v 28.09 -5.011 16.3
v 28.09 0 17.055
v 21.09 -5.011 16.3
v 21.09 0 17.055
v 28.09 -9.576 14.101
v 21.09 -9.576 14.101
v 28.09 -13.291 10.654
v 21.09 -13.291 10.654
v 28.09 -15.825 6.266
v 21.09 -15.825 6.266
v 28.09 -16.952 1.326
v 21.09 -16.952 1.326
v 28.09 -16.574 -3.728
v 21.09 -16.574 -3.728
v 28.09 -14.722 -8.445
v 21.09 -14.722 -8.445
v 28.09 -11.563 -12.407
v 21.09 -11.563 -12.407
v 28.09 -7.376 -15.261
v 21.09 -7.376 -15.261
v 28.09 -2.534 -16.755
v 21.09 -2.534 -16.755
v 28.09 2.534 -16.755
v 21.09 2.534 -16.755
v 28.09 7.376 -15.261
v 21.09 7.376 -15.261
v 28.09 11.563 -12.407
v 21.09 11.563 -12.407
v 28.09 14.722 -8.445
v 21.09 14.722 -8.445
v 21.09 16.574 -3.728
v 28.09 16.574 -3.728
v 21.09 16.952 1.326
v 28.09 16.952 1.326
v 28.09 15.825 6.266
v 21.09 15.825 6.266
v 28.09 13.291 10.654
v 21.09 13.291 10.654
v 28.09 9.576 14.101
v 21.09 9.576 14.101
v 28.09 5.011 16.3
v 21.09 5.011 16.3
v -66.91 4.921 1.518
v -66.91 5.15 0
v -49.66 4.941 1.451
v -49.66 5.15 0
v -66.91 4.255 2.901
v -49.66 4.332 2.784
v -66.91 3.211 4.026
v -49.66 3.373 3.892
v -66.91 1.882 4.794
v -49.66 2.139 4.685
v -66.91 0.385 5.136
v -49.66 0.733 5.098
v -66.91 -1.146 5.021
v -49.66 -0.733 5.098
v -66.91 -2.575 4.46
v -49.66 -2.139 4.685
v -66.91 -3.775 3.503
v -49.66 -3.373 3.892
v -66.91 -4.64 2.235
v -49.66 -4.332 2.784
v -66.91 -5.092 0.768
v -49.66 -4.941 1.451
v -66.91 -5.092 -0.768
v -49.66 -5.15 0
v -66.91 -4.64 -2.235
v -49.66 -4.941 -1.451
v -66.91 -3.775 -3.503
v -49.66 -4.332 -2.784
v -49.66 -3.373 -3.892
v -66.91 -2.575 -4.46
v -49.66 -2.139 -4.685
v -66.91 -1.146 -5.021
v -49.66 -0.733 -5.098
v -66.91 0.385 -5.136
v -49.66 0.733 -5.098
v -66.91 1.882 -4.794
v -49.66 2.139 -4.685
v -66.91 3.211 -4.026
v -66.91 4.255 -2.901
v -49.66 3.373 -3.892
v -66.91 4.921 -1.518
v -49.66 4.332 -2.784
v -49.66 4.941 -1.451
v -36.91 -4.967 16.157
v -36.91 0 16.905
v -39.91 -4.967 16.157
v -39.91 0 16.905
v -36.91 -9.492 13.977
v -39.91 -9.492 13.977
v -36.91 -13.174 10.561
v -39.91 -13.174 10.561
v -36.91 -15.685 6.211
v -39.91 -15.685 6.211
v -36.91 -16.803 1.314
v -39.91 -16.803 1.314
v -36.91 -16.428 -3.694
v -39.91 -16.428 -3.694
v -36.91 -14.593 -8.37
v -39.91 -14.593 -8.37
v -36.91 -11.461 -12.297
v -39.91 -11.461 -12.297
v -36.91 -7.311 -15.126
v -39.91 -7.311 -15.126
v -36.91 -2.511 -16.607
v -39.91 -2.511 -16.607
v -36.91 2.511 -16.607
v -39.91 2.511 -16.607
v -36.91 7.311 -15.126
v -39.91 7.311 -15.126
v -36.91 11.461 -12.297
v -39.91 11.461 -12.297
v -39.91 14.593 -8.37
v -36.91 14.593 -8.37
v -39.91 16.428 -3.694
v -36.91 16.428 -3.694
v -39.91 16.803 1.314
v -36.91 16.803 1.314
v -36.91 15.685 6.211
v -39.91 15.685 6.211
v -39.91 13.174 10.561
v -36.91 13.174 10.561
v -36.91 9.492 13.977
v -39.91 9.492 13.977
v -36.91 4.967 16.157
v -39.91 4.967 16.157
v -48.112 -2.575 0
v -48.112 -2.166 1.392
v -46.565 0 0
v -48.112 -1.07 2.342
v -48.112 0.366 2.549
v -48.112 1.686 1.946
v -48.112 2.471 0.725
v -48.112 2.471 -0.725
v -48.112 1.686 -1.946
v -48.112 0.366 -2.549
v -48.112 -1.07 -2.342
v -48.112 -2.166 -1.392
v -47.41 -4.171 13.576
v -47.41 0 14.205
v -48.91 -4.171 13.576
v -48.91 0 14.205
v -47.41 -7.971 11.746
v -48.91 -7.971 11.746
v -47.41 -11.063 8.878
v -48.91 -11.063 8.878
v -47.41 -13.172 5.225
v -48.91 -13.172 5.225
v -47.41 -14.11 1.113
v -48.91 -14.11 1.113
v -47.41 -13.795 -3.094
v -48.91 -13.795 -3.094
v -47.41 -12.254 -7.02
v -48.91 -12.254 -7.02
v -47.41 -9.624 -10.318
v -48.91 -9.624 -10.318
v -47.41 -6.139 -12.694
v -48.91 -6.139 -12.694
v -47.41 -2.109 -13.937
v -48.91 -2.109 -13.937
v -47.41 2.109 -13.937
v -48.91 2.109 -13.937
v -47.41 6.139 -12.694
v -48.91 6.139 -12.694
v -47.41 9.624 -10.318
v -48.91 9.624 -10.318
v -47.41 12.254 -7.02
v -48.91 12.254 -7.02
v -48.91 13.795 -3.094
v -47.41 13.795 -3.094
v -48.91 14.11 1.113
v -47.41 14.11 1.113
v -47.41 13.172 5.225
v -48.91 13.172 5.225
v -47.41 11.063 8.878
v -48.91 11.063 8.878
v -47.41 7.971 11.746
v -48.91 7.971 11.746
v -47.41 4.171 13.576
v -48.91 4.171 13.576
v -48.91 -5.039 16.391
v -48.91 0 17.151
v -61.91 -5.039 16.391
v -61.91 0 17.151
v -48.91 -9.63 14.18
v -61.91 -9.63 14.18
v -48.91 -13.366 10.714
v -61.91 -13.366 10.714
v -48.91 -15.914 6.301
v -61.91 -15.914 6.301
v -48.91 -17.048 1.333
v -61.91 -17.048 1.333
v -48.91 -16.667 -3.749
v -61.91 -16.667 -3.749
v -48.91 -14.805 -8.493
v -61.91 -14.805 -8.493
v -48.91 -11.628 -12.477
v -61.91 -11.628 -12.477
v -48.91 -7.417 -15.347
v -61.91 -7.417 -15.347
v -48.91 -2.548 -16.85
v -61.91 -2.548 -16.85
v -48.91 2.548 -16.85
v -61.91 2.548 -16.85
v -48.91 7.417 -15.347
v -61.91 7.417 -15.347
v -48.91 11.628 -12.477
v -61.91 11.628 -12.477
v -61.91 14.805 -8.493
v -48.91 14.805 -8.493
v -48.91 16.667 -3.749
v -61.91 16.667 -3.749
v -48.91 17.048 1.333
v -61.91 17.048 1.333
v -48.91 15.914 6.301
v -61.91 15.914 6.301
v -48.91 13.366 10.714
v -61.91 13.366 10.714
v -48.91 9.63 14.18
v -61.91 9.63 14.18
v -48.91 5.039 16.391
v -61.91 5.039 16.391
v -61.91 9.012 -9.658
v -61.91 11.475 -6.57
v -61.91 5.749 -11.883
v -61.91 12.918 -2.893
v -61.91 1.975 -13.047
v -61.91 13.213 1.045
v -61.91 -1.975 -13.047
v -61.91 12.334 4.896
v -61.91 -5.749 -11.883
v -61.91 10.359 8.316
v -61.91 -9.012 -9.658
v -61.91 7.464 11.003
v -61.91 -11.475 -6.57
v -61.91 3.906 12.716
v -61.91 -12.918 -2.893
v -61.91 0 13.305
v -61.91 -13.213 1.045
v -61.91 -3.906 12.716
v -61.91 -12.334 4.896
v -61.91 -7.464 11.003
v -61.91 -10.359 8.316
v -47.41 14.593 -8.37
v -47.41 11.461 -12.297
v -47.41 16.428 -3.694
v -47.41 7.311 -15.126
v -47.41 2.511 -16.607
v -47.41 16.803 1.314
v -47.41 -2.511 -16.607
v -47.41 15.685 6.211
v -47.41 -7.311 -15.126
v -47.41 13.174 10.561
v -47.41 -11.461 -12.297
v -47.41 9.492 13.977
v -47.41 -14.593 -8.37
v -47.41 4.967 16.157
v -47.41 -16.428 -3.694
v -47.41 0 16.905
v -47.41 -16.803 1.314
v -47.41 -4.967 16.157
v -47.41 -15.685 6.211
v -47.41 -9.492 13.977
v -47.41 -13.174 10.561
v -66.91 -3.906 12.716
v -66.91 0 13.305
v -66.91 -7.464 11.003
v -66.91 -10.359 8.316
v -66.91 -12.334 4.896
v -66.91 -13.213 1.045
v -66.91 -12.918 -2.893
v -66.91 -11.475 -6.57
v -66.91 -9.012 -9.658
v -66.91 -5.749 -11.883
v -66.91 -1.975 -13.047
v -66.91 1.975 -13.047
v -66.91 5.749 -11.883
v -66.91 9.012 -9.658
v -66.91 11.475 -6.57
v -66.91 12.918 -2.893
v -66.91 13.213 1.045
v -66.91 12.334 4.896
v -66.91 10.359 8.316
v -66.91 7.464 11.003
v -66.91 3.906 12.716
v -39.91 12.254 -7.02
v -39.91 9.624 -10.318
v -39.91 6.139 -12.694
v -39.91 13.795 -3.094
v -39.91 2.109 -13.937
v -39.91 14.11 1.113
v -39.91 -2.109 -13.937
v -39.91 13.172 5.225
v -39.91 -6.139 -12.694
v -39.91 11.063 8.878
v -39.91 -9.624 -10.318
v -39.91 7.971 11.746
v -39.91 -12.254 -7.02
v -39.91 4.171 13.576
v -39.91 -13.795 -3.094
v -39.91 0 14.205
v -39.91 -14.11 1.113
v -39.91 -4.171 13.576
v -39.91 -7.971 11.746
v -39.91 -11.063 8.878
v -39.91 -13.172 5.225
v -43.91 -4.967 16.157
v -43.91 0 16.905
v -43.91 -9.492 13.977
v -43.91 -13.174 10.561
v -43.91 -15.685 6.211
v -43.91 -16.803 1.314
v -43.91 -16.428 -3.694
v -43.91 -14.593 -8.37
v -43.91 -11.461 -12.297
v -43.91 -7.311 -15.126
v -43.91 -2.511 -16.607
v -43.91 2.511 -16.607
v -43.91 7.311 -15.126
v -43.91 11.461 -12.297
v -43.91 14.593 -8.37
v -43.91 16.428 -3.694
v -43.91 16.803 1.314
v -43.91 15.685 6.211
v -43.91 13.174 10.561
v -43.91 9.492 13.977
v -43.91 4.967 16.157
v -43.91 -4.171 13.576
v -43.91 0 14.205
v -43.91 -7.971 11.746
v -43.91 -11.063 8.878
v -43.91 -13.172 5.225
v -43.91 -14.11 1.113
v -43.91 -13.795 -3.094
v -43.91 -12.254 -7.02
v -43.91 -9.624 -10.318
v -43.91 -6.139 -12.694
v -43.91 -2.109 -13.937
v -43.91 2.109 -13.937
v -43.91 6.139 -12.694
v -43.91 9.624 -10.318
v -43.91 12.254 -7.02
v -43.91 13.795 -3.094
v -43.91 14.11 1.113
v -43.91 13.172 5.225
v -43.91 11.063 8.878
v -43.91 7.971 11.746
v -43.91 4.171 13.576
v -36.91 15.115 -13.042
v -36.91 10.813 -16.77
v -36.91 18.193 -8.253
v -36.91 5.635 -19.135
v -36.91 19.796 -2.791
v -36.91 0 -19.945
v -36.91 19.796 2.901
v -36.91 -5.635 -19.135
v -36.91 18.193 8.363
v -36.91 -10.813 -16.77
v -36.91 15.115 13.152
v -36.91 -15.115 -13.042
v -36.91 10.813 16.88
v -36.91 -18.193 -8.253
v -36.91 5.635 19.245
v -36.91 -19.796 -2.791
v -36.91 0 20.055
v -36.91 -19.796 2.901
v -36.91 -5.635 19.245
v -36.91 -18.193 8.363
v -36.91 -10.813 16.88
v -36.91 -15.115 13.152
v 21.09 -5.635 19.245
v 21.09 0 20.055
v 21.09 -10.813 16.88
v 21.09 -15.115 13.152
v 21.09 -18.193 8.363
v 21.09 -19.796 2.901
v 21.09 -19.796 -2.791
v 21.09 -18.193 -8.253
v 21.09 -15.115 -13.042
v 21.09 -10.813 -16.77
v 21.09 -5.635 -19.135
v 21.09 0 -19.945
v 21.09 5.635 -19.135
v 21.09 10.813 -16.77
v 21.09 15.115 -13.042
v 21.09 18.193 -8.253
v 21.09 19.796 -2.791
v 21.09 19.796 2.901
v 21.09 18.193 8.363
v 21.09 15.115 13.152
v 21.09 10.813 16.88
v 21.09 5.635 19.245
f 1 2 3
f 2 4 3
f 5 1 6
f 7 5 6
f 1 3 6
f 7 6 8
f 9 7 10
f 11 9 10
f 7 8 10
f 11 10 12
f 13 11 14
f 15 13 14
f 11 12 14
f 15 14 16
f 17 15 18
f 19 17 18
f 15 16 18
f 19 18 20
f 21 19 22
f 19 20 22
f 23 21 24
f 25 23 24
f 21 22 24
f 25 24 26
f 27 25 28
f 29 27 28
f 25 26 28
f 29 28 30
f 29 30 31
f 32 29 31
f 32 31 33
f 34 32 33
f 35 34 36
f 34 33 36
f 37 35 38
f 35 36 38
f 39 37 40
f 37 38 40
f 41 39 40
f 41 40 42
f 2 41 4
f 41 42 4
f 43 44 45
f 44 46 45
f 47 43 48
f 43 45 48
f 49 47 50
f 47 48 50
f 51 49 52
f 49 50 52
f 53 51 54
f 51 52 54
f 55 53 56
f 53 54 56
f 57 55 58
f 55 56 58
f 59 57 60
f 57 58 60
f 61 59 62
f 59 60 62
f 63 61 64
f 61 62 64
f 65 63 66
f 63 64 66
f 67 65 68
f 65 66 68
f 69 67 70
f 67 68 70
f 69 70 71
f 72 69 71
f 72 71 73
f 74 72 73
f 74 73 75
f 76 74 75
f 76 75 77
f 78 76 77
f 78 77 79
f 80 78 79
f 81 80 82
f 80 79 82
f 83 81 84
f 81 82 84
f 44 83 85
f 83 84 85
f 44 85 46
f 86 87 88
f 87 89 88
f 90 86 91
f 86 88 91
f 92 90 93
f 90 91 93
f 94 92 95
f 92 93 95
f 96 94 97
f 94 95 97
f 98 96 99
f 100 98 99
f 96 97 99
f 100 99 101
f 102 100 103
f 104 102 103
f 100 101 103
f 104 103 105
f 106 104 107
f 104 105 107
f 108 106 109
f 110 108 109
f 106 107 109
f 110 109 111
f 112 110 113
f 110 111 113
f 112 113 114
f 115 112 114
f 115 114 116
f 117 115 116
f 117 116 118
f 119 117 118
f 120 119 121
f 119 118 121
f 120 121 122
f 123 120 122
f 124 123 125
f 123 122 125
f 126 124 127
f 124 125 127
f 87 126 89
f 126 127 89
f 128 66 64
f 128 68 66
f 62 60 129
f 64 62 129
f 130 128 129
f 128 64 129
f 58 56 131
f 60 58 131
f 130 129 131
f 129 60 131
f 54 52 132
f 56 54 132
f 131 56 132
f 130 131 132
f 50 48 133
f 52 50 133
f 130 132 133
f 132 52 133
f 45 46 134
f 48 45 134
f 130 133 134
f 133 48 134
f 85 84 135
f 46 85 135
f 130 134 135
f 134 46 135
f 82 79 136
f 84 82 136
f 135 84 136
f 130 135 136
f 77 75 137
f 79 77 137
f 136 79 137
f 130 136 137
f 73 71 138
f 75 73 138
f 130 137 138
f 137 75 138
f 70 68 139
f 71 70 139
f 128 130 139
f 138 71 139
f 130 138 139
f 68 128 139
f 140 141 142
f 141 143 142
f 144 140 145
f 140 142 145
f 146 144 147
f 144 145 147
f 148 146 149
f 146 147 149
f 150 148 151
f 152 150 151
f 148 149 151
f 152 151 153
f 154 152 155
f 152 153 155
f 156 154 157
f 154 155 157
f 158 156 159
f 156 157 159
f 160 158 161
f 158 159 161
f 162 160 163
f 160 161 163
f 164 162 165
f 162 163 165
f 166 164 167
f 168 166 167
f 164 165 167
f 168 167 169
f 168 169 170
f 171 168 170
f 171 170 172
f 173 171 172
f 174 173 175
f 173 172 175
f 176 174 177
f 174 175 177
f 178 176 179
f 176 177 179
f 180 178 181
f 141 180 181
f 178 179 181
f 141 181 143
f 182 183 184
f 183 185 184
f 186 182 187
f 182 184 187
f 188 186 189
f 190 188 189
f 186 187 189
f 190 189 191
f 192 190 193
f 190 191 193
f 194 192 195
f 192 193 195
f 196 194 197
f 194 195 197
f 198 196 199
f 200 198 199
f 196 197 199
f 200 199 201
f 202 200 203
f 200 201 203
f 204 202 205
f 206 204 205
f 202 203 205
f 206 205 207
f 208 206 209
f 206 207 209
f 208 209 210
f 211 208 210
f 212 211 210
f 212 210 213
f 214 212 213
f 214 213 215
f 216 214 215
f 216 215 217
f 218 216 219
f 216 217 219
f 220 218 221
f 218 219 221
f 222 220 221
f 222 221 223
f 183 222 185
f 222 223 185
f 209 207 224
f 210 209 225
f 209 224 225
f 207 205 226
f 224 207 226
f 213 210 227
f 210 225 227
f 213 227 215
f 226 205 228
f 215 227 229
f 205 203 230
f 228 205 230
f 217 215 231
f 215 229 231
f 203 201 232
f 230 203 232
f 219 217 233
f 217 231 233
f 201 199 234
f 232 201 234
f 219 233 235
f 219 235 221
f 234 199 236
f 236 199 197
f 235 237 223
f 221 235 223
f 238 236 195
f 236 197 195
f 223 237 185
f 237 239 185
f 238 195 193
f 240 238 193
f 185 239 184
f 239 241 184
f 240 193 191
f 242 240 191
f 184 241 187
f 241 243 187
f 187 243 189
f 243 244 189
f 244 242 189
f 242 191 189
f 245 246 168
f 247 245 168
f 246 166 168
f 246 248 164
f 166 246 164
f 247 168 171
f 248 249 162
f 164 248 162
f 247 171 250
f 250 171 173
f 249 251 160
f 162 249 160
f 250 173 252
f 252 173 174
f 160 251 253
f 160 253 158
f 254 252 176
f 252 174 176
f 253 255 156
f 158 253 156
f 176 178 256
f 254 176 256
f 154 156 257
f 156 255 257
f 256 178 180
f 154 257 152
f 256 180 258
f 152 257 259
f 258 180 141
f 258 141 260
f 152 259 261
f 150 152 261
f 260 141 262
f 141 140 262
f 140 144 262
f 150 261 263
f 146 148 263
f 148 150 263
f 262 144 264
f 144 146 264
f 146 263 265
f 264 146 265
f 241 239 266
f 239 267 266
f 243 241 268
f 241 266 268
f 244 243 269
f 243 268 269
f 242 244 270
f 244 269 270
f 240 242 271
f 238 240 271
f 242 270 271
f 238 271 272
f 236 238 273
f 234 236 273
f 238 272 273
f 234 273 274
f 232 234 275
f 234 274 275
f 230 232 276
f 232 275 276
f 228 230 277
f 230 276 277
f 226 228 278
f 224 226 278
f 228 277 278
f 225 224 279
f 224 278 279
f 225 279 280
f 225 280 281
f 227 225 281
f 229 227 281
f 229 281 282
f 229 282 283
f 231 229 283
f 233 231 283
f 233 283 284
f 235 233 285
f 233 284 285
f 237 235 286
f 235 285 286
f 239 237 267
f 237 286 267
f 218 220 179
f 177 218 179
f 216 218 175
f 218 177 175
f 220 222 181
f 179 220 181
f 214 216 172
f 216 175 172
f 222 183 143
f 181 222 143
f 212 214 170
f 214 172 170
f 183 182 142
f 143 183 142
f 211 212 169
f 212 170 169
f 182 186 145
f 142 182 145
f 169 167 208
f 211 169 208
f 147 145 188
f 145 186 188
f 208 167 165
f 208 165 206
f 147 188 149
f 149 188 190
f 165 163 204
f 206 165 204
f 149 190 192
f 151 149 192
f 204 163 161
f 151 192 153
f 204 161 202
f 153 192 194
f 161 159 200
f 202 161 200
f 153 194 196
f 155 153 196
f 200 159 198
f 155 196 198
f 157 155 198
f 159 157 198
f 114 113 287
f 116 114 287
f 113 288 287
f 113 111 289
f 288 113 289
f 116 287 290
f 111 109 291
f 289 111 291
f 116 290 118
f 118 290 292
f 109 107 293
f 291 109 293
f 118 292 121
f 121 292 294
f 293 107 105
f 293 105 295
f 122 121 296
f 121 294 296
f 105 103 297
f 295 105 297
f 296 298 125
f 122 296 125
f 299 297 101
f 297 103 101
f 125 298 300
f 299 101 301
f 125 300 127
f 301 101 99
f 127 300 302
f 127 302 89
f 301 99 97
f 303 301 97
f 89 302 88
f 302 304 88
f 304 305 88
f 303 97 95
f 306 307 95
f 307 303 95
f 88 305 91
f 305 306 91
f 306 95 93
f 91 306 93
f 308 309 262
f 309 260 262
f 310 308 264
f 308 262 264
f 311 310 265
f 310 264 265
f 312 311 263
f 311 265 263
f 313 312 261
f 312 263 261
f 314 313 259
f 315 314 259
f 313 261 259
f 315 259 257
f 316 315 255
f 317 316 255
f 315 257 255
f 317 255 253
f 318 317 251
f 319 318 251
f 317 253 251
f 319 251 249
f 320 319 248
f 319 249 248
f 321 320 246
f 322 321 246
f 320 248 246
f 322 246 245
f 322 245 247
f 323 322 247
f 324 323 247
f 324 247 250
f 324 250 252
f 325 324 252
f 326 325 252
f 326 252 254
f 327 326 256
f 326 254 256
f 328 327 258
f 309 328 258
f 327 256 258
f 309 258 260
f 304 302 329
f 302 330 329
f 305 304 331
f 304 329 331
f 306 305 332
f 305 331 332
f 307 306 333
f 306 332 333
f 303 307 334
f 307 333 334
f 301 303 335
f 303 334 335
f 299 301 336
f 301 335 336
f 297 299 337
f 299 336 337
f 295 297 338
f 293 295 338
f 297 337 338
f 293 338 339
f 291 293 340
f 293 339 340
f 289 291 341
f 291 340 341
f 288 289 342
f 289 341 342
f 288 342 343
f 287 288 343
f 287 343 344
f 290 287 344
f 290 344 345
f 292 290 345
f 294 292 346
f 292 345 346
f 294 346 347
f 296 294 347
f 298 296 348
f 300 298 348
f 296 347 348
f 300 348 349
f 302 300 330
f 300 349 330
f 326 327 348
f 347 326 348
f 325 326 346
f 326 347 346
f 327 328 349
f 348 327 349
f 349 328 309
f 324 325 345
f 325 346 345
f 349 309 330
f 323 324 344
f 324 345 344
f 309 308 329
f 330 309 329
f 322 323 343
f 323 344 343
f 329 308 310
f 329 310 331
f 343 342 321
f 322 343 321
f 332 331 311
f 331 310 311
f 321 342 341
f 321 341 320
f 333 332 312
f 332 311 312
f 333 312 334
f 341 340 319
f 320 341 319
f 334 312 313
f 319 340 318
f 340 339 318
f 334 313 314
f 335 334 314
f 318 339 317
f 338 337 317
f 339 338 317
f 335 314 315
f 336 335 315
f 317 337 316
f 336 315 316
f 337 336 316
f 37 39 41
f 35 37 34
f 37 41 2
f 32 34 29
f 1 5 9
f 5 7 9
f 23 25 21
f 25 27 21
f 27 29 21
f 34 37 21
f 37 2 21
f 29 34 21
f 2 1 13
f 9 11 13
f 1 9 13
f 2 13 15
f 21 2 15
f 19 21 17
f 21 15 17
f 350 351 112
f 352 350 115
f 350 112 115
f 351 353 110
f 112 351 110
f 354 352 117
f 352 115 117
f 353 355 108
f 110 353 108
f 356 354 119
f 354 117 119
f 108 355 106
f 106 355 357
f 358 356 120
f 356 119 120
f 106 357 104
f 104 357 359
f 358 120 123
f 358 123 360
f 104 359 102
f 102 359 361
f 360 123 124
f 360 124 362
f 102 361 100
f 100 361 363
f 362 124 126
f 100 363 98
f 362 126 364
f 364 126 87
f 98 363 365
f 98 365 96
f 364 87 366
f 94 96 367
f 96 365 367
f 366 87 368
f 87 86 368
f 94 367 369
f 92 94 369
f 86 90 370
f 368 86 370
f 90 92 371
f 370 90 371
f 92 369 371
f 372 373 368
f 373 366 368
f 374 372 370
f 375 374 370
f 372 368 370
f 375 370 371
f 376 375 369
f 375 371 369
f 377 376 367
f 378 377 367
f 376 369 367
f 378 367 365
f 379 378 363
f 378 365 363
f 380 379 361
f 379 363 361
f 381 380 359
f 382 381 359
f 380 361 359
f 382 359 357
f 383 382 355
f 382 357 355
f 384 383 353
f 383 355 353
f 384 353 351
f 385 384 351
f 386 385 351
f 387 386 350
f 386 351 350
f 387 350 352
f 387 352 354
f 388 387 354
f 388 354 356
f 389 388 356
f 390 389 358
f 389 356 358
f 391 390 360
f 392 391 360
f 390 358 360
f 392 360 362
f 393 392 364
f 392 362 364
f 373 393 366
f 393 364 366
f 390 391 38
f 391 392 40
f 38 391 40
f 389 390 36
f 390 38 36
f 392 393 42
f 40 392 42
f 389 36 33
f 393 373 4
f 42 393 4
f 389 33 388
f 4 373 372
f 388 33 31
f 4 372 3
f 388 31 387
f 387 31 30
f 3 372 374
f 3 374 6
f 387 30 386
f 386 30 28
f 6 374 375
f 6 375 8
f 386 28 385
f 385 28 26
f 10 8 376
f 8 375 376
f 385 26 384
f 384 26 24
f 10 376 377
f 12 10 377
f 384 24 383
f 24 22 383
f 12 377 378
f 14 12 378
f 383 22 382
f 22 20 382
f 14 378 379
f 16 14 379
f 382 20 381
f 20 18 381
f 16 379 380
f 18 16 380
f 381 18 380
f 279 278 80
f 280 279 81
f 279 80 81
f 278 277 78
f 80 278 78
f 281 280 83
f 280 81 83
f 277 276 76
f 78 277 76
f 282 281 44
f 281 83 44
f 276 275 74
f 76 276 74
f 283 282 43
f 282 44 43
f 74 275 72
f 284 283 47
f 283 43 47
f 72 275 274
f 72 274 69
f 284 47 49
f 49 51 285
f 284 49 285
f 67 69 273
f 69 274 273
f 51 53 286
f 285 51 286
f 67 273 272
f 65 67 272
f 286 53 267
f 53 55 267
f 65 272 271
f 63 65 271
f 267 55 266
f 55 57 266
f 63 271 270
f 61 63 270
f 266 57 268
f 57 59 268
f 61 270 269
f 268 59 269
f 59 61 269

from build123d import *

# Parameters (mm, degrees)
F3_D     = 10.3
F3_DEPTH = 17.25
F3_TIP   = 3.094432188


with BuildPart() as f1:
    # F0 (on Front) → F1 (revolve)
    with BuildSketch(Plane.XZ):
        Polygon((-66.909504354, 13.3051262531), (-66.909504354, 0.0551262531), (28.090495646, 0.0551262531), (28.090495646, 17.0551262531), (21.090495646, 17.0551262531), (21.090495646, 20.0551262531), (-36.909504354, 20.0551262531), (-36.909504354, 16.9051262531), (-39.909504354, 16.9051262531), (-39.909504354, 14.2051262531), (-43.909504354, 14.2051262531), (-43.909504354, 16.9051262531), (-47.409504354, 16.9051262531), (-47.409504354, 14.2051262531), (-48.909504354, 14.2051262531), (-48.909504354, 17.1507116718), (-61.909504354, 17.1507116718), (-61.909504354, 13.3051262531), align=None)
    revolve(axis=Axis((-19.409504354, 0, 0.0551262531), (1, 0, 0)))

    # F3
    with Locations(Plane(origin=(-66.909504354, 0, 0), x_dir=(0, -1, 0), z_dir=(-1, 0, 0))):
        with Locations((0, 0)):
            Hole(F3_D / 2, depth=F3_DEPTH)
            with Locations((0, 0, -(F3_DEPTH + F3_TIP / 2))):  # 118° drill point
                Cone(0, F3_D / 2, F3_TIP, mode=Mode.SUBTRACT)


solid = f1.part
